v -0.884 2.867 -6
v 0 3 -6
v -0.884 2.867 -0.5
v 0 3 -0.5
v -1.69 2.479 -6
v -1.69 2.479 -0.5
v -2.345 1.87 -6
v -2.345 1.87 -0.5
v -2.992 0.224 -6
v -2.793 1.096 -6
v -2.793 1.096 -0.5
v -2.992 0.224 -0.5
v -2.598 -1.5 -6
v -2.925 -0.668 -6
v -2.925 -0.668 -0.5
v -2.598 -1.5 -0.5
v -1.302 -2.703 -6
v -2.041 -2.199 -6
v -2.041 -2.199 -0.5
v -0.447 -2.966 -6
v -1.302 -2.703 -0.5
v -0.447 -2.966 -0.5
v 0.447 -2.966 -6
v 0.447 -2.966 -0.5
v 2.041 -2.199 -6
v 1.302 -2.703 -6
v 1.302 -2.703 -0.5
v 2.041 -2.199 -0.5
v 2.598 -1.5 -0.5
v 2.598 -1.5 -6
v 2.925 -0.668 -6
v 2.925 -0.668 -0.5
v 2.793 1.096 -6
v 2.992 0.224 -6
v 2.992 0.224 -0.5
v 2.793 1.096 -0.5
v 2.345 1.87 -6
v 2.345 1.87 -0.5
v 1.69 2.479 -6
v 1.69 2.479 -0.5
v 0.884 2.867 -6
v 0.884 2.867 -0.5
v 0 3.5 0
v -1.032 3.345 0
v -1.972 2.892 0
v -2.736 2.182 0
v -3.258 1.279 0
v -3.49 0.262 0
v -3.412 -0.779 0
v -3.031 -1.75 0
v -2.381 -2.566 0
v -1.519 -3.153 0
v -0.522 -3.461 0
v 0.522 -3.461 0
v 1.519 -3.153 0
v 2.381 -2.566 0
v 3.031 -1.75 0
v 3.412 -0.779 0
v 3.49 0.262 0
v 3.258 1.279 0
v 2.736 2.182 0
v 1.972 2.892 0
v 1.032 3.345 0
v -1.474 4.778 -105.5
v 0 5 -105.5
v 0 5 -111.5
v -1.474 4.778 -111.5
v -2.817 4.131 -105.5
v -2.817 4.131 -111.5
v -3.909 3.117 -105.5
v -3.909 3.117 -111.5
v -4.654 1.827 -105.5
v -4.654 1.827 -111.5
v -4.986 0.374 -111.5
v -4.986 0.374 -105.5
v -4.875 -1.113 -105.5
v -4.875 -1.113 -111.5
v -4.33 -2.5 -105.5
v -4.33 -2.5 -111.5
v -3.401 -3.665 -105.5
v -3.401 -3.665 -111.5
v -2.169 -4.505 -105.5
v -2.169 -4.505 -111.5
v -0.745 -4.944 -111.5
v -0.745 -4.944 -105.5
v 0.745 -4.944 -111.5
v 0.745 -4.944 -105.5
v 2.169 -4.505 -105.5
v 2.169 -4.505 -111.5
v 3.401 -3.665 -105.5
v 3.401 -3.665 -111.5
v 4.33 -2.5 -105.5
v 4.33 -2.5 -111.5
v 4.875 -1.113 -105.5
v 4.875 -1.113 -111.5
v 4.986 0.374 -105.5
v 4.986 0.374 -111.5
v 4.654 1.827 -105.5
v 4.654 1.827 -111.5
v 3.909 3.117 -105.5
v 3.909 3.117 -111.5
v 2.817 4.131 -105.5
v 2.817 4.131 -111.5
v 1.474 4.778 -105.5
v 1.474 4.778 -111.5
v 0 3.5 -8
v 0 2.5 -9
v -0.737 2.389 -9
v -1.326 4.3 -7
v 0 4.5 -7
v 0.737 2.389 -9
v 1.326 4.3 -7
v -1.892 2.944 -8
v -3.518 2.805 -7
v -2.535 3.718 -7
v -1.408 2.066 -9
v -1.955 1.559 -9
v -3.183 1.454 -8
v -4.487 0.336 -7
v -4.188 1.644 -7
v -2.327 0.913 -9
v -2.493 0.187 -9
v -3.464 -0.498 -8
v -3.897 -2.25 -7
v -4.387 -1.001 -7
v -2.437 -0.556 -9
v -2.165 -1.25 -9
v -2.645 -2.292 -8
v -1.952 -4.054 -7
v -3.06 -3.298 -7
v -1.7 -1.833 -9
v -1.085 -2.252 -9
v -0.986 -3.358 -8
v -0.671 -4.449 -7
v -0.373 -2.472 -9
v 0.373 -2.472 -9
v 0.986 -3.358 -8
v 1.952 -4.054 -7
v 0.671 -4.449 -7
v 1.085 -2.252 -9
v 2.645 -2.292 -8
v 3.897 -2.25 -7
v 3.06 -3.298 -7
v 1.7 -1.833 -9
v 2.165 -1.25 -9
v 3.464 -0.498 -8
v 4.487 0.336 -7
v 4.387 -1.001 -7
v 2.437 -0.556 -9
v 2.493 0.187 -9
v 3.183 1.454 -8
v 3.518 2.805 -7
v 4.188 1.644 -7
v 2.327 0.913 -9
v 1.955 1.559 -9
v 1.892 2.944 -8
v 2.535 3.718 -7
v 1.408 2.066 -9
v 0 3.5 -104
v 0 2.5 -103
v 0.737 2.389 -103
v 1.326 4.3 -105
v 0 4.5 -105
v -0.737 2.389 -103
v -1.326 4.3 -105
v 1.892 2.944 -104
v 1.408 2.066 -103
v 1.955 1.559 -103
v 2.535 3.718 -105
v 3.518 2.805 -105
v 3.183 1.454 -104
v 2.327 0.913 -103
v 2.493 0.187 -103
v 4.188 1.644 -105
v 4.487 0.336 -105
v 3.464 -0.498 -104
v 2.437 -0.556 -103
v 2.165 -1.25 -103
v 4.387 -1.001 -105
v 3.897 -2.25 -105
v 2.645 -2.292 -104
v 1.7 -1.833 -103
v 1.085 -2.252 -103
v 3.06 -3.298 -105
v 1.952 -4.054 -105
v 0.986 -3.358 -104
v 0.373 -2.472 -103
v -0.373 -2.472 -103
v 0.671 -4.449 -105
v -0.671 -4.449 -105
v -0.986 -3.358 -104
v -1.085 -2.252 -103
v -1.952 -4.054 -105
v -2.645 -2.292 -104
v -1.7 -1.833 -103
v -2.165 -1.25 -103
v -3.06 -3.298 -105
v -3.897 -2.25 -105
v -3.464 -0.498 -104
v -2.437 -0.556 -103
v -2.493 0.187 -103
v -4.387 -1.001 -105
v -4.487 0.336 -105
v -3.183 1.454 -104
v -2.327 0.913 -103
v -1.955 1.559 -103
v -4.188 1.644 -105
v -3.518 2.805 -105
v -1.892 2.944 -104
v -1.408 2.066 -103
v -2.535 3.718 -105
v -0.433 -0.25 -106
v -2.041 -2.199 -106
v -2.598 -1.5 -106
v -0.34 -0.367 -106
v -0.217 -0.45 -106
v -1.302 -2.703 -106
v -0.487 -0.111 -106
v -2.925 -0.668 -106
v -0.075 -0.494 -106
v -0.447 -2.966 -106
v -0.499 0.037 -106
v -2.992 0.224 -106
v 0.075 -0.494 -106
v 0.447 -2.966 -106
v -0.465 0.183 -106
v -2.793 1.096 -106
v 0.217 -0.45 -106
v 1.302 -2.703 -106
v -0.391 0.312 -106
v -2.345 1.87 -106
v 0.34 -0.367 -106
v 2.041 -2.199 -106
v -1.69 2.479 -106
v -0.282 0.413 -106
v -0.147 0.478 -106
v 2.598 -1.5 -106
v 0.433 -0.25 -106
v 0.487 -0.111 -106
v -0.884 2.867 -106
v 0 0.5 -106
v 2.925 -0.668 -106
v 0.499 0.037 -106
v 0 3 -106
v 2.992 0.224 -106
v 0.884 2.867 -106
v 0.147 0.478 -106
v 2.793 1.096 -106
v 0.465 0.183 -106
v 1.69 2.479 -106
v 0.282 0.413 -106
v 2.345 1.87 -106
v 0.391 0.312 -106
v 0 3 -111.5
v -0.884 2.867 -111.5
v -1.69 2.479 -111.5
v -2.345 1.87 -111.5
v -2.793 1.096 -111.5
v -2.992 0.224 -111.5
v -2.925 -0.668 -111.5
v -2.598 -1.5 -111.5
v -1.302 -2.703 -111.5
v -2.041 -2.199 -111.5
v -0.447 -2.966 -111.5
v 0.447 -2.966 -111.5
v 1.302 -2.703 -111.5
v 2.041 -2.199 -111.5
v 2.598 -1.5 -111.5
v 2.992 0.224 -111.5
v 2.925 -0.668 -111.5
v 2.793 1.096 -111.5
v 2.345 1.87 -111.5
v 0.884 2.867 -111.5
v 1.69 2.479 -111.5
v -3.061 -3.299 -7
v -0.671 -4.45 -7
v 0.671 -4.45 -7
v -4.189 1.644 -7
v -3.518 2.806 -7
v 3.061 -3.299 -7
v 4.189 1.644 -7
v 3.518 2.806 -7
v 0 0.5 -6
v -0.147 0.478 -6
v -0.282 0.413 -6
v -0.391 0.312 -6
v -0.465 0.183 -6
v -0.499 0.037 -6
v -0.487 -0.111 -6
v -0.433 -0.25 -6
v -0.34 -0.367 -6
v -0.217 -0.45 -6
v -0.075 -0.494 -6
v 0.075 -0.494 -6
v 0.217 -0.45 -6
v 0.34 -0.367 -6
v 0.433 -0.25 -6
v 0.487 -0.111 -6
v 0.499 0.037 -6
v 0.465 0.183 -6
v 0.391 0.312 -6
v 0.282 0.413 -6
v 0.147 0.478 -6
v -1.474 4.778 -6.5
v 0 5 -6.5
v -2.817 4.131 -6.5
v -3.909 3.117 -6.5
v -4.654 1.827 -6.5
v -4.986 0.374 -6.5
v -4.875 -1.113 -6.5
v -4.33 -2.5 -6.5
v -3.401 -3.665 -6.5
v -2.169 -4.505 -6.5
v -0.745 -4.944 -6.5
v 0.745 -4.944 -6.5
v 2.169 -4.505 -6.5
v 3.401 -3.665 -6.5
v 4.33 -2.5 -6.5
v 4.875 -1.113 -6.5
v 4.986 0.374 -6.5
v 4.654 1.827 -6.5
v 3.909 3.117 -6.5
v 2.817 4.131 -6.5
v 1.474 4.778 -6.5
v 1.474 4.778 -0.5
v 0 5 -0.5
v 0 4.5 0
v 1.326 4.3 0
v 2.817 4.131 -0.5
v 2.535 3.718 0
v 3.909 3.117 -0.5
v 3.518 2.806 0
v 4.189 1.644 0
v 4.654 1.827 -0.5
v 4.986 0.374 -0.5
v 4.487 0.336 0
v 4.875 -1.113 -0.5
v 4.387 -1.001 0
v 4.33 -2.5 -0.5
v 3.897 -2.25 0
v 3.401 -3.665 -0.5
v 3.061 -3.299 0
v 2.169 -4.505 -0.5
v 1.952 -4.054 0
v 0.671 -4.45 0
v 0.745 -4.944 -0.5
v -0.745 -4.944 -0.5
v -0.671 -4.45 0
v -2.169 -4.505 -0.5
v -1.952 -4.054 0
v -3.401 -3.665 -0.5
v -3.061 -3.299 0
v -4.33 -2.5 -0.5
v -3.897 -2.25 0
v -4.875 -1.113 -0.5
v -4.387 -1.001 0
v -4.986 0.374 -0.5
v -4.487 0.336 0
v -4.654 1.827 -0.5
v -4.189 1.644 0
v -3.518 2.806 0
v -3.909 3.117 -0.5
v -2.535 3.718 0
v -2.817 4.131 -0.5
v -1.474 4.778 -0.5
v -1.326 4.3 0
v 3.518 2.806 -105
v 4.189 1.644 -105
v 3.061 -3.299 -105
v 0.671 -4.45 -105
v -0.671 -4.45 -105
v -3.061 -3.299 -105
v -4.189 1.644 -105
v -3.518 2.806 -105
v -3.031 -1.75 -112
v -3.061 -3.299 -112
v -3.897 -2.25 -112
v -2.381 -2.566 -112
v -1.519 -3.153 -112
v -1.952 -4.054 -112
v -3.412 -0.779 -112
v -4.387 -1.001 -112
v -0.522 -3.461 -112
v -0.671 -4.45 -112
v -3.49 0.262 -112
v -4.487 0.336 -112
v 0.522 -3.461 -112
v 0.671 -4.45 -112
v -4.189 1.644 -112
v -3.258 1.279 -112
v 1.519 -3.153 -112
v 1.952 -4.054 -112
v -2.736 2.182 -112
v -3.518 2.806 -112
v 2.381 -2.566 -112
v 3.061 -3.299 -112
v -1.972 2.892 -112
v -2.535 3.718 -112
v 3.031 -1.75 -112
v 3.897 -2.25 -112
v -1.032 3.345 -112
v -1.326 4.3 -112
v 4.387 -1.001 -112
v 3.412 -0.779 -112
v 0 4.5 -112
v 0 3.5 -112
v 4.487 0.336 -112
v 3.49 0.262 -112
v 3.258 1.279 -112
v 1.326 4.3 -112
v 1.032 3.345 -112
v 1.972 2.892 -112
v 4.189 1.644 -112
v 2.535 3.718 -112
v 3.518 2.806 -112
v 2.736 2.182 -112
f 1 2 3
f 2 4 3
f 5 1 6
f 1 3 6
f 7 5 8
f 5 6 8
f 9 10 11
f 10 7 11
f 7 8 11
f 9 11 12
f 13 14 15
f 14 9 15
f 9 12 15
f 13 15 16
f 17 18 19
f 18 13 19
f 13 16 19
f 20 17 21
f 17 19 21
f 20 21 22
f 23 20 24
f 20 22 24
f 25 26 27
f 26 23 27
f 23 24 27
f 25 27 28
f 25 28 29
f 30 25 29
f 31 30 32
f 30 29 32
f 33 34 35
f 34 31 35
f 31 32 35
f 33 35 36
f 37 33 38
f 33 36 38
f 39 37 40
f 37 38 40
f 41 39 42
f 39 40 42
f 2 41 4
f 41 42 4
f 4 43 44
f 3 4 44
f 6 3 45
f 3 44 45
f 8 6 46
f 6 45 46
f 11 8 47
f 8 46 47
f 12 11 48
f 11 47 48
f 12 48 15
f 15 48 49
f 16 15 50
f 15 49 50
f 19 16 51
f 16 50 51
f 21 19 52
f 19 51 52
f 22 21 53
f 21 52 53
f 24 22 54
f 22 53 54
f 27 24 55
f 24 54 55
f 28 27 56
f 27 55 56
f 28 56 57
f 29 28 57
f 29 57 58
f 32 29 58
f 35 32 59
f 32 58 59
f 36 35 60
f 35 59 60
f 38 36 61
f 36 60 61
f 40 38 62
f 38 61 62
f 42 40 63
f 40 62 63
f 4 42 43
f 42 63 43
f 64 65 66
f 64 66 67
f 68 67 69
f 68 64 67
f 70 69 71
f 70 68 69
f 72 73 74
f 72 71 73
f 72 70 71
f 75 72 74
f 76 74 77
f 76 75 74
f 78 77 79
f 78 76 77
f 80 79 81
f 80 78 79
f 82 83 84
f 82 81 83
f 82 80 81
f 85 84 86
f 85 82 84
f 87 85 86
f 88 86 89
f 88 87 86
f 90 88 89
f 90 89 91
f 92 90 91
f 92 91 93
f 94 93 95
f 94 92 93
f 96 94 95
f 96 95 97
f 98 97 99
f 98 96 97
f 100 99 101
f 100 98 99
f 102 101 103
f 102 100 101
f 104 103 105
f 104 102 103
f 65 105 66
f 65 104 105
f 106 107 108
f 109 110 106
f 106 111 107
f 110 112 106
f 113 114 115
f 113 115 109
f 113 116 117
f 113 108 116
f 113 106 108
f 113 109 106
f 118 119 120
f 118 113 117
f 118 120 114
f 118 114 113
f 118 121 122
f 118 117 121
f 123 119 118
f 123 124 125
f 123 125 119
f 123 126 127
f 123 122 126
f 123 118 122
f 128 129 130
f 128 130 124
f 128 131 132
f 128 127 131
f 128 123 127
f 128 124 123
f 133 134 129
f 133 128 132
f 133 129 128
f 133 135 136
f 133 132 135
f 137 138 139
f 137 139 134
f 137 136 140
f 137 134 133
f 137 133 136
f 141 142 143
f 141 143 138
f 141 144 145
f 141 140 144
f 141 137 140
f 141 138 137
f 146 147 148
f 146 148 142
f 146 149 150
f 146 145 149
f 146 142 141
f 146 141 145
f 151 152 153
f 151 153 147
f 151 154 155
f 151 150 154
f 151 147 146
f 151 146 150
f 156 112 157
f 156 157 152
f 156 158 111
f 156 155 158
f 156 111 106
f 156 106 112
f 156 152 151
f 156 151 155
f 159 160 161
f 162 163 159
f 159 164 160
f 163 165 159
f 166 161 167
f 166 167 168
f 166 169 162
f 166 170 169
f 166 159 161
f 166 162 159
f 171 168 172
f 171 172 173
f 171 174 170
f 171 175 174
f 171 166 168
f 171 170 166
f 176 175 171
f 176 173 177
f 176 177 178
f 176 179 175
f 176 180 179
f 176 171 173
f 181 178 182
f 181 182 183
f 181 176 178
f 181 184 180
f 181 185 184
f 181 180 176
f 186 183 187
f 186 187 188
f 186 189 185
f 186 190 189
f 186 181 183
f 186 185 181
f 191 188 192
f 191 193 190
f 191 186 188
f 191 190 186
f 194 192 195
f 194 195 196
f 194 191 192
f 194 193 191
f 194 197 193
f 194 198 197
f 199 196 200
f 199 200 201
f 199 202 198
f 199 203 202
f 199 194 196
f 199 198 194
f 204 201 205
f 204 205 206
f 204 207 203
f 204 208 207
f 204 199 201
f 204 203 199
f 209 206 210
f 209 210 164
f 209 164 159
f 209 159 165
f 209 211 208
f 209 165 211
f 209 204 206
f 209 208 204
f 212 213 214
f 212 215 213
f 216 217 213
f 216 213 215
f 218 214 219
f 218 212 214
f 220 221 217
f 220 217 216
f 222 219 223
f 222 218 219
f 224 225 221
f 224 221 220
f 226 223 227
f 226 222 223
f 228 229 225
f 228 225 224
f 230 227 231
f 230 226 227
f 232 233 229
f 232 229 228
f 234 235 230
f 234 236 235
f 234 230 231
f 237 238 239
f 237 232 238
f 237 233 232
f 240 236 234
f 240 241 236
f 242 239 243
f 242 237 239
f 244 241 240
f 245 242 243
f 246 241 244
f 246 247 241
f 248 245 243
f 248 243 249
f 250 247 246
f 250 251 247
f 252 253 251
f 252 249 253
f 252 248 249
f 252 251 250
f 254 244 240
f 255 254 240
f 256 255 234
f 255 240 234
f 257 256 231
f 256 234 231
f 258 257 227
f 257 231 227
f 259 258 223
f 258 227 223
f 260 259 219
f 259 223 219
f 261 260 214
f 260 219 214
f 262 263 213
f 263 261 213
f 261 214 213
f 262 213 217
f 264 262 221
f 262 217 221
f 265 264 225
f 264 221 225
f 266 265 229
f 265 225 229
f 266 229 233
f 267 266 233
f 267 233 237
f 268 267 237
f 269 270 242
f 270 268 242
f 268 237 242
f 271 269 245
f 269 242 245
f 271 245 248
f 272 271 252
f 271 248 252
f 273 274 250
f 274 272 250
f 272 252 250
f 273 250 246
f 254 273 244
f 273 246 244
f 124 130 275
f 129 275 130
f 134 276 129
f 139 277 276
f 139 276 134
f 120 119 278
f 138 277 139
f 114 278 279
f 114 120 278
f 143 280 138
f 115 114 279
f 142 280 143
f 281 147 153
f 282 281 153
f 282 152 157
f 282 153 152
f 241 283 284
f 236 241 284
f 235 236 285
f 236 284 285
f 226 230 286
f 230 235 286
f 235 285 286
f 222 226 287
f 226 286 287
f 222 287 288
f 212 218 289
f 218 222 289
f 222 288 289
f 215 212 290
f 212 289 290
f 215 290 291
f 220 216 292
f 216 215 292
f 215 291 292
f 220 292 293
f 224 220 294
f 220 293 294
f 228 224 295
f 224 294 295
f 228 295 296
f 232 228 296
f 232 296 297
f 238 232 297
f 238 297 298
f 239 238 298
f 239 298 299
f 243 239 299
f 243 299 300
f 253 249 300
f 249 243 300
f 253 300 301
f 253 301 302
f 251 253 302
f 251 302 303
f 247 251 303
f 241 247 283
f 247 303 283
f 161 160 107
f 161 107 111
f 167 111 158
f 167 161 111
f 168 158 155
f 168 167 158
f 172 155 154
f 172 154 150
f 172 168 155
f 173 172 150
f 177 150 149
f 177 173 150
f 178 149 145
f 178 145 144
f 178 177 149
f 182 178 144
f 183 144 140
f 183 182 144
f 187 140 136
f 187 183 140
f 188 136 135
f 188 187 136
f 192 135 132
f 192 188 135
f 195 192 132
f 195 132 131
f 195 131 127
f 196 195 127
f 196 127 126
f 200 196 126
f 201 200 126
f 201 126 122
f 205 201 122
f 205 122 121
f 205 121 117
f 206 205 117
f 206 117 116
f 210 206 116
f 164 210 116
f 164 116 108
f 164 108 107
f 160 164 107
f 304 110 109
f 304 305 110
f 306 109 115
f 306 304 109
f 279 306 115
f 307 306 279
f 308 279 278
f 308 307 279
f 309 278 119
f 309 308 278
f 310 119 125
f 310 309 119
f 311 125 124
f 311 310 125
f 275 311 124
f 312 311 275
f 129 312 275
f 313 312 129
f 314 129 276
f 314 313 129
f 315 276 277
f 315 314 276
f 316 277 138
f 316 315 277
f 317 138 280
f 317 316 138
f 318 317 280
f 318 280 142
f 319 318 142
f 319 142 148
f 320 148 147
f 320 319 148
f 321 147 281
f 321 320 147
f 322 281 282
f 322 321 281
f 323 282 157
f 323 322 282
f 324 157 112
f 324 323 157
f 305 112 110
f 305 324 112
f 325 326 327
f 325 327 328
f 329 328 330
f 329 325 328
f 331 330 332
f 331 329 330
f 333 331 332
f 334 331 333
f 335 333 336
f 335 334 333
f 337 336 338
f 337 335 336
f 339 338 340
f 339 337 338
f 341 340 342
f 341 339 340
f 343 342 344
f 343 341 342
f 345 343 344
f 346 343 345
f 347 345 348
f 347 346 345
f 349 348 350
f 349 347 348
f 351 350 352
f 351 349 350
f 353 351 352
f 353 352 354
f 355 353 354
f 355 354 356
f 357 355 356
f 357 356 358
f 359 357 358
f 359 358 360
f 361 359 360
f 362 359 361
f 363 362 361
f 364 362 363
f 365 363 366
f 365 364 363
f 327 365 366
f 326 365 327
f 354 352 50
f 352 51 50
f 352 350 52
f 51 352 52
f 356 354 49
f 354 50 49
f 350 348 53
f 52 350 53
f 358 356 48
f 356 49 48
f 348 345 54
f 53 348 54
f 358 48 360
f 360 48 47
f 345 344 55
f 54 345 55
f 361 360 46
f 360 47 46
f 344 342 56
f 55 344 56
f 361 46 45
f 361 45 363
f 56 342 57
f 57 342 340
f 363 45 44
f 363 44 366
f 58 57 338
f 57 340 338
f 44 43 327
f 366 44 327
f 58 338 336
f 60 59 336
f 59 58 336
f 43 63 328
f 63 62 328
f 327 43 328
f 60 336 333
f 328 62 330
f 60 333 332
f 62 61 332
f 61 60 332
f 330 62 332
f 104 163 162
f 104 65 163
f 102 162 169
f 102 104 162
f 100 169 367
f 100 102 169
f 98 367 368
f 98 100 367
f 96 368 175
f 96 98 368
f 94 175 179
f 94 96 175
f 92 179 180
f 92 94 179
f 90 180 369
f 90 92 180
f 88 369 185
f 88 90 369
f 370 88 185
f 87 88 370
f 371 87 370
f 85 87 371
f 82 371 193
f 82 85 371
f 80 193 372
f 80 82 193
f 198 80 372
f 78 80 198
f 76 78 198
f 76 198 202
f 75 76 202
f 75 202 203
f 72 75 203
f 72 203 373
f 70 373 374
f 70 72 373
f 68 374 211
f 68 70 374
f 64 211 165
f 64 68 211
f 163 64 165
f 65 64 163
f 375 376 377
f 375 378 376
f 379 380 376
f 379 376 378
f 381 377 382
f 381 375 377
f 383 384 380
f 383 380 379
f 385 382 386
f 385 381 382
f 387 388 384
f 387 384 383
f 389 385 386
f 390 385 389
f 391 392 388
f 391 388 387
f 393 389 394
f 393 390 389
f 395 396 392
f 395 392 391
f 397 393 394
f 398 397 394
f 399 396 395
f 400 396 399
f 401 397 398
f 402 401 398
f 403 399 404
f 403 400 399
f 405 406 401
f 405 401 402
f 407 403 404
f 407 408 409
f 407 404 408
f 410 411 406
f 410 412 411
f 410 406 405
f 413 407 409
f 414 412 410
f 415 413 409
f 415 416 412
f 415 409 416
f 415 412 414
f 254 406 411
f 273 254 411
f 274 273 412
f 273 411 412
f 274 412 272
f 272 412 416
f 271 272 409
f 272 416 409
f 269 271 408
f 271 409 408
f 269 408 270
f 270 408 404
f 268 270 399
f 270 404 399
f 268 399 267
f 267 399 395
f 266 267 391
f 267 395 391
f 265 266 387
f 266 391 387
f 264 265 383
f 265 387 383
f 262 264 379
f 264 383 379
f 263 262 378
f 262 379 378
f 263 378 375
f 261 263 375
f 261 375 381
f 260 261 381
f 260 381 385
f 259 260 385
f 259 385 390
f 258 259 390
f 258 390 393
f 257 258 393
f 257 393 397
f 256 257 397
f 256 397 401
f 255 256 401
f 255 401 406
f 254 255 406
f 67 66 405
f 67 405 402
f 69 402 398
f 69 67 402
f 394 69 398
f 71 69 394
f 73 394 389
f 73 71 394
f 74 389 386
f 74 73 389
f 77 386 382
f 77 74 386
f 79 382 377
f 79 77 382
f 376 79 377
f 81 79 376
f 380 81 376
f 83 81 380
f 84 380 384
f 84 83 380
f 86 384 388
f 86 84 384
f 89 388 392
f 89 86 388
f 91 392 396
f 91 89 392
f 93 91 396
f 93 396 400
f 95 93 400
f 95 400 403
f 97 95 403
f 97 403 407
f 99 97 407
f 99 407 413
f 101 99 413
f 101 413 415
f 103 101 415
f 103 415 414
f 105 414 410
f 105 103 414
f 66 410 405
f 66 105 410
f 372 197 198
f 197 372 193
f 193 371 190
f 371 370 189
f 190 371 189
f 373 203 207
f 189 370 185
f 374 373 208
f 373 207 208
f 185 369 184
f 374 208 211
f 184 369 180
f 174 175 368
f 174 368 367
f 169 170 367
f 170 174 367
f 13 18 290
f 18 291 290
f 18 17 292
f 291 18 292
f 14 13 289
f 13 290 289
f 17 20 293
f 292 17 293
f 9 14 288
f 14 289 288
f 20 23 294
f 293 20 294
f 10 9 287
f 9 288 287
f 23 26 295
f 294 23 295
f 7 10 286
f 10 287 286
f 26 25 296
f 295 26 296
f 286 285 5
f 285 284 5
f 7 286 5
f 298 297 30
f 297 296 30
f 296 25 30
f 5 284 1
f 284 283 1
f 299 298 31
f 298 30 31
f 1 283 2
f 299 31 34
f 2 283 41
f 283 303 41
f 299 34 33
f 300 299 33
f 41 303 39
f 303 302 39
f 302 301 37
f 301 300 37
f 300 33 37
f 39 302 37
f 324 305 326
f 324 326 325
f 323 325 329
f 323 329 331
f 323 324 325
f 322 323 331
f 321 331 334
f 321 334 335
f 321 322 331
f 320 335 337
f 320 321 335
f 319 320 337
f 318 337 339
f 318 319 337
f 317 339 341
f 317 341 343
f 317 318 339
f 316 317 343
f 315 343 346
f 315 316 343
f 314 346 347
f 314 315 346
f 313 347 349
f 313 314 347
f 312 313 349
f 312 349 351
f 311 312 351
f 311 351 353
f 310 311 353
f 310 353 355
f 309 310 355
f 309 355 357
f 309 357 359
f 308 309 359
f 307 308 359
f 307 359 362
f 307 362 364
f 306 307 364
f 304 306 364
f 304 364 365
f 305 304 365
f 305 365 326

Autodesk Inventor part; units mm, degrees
ref_plane "YZ Plane" through (0, 0, 0) normal (1, 0, 0) x (0, 1, 0)
ref_plane "XZ Plane" through (0, 0, 0) normal (0, 1, 0) x (-1, 0, 0)
ref_plane "XY Plane" through (0, 0, 0) normal (0, 0, 1) x (1, 0, 0)
sketch "Sketch1" plane through (0, 0, 0) normal (1, 0, 0) x (0, 1, 0)
  line L0 (0, 0) -> (0, -112)
  line L1 (0, -112) -> (3, -112)
  line L2 (3, -112) -> (3, 0)
  line L3 (3, 0) -> (0, 0)
  line L4 (3, 0) -> (3, -6)
  line L5 (3, -112) -> (3, -106)
  line L6 (3, -112) -> (5, -112)
  line L7 (5, -112) -> (5, -106)
  line L8 (5, -106) -> (3, -106)
  line L9 (3, 0) -> (5, 0)
  line L10 (5, 0) -> (5, -6)
  line L11 (5, -6) -> (3, -6)
  line L12 (3, -106) -> (0.5, -106)
  line L13 (0.5, -106) -> (0.5, -6)
  line L14 (0.5, -6) -> (3, -6)
  line L15 (5, -6) -> (5, -7)
  line L16 (5, -7) -> (0.5, -7)
  line L17 (5, -106) -> (5, -105)
  line L18 (5, -105) -> (0.5, -105)
  line L19 (3, -7) -> (3.1, -7)
  line L20 (2.5, -7) -> (2.5, -105)
  point P0 (3, -105)
  point P1 (2, -6)
  point P2 (3.1, -105)
  dimension "d0" = 112
  dimension "d1" = 3
  dimension "d2" = 6
  dimension "d3" = 6
  dimension "d5" = 2
  dimension "d6" = 2
  dimension "d7" = 2.5
  dimension "d8" = 1
  dimension "d9" = 1
  dimension "d22" = 2
revolve "Revolution1" add sketch "Sketch1" angle 360 about axis through (0, 0, 0) along (0, 0, -1) contours L9 L10 L11 L2 | L2 L8 L7 L6 | L11 L15 L16 L2 | L2 L16 L13 L14 | L12 L13 L18 L2 | L2 L18 L17 L8 | L20 L18 L13 L16
thread "Thread1" size "M6x1" class "6H" standard "ANSI Metric M Profile" full length
thread "Thread2" size "M6x1" class "6H" standard "ANSI Metric M Profile" full length
chamfer "Chamfer1" distance 0.5 angle 45 2 edges at (0, -3, 0) (0, -3, -112)
chamfer "Chamfer2" distance 0.5 angle 45 4 edges at (0, -5, -112) (0, -5, -105) (0, -5, -7) (0, -5, 0)
chamfer "Chamfer3" distance 2 angle 45 2 edges at (0, -2.5, -7) (0, -2.5, -105)
properties part number "Heater"
